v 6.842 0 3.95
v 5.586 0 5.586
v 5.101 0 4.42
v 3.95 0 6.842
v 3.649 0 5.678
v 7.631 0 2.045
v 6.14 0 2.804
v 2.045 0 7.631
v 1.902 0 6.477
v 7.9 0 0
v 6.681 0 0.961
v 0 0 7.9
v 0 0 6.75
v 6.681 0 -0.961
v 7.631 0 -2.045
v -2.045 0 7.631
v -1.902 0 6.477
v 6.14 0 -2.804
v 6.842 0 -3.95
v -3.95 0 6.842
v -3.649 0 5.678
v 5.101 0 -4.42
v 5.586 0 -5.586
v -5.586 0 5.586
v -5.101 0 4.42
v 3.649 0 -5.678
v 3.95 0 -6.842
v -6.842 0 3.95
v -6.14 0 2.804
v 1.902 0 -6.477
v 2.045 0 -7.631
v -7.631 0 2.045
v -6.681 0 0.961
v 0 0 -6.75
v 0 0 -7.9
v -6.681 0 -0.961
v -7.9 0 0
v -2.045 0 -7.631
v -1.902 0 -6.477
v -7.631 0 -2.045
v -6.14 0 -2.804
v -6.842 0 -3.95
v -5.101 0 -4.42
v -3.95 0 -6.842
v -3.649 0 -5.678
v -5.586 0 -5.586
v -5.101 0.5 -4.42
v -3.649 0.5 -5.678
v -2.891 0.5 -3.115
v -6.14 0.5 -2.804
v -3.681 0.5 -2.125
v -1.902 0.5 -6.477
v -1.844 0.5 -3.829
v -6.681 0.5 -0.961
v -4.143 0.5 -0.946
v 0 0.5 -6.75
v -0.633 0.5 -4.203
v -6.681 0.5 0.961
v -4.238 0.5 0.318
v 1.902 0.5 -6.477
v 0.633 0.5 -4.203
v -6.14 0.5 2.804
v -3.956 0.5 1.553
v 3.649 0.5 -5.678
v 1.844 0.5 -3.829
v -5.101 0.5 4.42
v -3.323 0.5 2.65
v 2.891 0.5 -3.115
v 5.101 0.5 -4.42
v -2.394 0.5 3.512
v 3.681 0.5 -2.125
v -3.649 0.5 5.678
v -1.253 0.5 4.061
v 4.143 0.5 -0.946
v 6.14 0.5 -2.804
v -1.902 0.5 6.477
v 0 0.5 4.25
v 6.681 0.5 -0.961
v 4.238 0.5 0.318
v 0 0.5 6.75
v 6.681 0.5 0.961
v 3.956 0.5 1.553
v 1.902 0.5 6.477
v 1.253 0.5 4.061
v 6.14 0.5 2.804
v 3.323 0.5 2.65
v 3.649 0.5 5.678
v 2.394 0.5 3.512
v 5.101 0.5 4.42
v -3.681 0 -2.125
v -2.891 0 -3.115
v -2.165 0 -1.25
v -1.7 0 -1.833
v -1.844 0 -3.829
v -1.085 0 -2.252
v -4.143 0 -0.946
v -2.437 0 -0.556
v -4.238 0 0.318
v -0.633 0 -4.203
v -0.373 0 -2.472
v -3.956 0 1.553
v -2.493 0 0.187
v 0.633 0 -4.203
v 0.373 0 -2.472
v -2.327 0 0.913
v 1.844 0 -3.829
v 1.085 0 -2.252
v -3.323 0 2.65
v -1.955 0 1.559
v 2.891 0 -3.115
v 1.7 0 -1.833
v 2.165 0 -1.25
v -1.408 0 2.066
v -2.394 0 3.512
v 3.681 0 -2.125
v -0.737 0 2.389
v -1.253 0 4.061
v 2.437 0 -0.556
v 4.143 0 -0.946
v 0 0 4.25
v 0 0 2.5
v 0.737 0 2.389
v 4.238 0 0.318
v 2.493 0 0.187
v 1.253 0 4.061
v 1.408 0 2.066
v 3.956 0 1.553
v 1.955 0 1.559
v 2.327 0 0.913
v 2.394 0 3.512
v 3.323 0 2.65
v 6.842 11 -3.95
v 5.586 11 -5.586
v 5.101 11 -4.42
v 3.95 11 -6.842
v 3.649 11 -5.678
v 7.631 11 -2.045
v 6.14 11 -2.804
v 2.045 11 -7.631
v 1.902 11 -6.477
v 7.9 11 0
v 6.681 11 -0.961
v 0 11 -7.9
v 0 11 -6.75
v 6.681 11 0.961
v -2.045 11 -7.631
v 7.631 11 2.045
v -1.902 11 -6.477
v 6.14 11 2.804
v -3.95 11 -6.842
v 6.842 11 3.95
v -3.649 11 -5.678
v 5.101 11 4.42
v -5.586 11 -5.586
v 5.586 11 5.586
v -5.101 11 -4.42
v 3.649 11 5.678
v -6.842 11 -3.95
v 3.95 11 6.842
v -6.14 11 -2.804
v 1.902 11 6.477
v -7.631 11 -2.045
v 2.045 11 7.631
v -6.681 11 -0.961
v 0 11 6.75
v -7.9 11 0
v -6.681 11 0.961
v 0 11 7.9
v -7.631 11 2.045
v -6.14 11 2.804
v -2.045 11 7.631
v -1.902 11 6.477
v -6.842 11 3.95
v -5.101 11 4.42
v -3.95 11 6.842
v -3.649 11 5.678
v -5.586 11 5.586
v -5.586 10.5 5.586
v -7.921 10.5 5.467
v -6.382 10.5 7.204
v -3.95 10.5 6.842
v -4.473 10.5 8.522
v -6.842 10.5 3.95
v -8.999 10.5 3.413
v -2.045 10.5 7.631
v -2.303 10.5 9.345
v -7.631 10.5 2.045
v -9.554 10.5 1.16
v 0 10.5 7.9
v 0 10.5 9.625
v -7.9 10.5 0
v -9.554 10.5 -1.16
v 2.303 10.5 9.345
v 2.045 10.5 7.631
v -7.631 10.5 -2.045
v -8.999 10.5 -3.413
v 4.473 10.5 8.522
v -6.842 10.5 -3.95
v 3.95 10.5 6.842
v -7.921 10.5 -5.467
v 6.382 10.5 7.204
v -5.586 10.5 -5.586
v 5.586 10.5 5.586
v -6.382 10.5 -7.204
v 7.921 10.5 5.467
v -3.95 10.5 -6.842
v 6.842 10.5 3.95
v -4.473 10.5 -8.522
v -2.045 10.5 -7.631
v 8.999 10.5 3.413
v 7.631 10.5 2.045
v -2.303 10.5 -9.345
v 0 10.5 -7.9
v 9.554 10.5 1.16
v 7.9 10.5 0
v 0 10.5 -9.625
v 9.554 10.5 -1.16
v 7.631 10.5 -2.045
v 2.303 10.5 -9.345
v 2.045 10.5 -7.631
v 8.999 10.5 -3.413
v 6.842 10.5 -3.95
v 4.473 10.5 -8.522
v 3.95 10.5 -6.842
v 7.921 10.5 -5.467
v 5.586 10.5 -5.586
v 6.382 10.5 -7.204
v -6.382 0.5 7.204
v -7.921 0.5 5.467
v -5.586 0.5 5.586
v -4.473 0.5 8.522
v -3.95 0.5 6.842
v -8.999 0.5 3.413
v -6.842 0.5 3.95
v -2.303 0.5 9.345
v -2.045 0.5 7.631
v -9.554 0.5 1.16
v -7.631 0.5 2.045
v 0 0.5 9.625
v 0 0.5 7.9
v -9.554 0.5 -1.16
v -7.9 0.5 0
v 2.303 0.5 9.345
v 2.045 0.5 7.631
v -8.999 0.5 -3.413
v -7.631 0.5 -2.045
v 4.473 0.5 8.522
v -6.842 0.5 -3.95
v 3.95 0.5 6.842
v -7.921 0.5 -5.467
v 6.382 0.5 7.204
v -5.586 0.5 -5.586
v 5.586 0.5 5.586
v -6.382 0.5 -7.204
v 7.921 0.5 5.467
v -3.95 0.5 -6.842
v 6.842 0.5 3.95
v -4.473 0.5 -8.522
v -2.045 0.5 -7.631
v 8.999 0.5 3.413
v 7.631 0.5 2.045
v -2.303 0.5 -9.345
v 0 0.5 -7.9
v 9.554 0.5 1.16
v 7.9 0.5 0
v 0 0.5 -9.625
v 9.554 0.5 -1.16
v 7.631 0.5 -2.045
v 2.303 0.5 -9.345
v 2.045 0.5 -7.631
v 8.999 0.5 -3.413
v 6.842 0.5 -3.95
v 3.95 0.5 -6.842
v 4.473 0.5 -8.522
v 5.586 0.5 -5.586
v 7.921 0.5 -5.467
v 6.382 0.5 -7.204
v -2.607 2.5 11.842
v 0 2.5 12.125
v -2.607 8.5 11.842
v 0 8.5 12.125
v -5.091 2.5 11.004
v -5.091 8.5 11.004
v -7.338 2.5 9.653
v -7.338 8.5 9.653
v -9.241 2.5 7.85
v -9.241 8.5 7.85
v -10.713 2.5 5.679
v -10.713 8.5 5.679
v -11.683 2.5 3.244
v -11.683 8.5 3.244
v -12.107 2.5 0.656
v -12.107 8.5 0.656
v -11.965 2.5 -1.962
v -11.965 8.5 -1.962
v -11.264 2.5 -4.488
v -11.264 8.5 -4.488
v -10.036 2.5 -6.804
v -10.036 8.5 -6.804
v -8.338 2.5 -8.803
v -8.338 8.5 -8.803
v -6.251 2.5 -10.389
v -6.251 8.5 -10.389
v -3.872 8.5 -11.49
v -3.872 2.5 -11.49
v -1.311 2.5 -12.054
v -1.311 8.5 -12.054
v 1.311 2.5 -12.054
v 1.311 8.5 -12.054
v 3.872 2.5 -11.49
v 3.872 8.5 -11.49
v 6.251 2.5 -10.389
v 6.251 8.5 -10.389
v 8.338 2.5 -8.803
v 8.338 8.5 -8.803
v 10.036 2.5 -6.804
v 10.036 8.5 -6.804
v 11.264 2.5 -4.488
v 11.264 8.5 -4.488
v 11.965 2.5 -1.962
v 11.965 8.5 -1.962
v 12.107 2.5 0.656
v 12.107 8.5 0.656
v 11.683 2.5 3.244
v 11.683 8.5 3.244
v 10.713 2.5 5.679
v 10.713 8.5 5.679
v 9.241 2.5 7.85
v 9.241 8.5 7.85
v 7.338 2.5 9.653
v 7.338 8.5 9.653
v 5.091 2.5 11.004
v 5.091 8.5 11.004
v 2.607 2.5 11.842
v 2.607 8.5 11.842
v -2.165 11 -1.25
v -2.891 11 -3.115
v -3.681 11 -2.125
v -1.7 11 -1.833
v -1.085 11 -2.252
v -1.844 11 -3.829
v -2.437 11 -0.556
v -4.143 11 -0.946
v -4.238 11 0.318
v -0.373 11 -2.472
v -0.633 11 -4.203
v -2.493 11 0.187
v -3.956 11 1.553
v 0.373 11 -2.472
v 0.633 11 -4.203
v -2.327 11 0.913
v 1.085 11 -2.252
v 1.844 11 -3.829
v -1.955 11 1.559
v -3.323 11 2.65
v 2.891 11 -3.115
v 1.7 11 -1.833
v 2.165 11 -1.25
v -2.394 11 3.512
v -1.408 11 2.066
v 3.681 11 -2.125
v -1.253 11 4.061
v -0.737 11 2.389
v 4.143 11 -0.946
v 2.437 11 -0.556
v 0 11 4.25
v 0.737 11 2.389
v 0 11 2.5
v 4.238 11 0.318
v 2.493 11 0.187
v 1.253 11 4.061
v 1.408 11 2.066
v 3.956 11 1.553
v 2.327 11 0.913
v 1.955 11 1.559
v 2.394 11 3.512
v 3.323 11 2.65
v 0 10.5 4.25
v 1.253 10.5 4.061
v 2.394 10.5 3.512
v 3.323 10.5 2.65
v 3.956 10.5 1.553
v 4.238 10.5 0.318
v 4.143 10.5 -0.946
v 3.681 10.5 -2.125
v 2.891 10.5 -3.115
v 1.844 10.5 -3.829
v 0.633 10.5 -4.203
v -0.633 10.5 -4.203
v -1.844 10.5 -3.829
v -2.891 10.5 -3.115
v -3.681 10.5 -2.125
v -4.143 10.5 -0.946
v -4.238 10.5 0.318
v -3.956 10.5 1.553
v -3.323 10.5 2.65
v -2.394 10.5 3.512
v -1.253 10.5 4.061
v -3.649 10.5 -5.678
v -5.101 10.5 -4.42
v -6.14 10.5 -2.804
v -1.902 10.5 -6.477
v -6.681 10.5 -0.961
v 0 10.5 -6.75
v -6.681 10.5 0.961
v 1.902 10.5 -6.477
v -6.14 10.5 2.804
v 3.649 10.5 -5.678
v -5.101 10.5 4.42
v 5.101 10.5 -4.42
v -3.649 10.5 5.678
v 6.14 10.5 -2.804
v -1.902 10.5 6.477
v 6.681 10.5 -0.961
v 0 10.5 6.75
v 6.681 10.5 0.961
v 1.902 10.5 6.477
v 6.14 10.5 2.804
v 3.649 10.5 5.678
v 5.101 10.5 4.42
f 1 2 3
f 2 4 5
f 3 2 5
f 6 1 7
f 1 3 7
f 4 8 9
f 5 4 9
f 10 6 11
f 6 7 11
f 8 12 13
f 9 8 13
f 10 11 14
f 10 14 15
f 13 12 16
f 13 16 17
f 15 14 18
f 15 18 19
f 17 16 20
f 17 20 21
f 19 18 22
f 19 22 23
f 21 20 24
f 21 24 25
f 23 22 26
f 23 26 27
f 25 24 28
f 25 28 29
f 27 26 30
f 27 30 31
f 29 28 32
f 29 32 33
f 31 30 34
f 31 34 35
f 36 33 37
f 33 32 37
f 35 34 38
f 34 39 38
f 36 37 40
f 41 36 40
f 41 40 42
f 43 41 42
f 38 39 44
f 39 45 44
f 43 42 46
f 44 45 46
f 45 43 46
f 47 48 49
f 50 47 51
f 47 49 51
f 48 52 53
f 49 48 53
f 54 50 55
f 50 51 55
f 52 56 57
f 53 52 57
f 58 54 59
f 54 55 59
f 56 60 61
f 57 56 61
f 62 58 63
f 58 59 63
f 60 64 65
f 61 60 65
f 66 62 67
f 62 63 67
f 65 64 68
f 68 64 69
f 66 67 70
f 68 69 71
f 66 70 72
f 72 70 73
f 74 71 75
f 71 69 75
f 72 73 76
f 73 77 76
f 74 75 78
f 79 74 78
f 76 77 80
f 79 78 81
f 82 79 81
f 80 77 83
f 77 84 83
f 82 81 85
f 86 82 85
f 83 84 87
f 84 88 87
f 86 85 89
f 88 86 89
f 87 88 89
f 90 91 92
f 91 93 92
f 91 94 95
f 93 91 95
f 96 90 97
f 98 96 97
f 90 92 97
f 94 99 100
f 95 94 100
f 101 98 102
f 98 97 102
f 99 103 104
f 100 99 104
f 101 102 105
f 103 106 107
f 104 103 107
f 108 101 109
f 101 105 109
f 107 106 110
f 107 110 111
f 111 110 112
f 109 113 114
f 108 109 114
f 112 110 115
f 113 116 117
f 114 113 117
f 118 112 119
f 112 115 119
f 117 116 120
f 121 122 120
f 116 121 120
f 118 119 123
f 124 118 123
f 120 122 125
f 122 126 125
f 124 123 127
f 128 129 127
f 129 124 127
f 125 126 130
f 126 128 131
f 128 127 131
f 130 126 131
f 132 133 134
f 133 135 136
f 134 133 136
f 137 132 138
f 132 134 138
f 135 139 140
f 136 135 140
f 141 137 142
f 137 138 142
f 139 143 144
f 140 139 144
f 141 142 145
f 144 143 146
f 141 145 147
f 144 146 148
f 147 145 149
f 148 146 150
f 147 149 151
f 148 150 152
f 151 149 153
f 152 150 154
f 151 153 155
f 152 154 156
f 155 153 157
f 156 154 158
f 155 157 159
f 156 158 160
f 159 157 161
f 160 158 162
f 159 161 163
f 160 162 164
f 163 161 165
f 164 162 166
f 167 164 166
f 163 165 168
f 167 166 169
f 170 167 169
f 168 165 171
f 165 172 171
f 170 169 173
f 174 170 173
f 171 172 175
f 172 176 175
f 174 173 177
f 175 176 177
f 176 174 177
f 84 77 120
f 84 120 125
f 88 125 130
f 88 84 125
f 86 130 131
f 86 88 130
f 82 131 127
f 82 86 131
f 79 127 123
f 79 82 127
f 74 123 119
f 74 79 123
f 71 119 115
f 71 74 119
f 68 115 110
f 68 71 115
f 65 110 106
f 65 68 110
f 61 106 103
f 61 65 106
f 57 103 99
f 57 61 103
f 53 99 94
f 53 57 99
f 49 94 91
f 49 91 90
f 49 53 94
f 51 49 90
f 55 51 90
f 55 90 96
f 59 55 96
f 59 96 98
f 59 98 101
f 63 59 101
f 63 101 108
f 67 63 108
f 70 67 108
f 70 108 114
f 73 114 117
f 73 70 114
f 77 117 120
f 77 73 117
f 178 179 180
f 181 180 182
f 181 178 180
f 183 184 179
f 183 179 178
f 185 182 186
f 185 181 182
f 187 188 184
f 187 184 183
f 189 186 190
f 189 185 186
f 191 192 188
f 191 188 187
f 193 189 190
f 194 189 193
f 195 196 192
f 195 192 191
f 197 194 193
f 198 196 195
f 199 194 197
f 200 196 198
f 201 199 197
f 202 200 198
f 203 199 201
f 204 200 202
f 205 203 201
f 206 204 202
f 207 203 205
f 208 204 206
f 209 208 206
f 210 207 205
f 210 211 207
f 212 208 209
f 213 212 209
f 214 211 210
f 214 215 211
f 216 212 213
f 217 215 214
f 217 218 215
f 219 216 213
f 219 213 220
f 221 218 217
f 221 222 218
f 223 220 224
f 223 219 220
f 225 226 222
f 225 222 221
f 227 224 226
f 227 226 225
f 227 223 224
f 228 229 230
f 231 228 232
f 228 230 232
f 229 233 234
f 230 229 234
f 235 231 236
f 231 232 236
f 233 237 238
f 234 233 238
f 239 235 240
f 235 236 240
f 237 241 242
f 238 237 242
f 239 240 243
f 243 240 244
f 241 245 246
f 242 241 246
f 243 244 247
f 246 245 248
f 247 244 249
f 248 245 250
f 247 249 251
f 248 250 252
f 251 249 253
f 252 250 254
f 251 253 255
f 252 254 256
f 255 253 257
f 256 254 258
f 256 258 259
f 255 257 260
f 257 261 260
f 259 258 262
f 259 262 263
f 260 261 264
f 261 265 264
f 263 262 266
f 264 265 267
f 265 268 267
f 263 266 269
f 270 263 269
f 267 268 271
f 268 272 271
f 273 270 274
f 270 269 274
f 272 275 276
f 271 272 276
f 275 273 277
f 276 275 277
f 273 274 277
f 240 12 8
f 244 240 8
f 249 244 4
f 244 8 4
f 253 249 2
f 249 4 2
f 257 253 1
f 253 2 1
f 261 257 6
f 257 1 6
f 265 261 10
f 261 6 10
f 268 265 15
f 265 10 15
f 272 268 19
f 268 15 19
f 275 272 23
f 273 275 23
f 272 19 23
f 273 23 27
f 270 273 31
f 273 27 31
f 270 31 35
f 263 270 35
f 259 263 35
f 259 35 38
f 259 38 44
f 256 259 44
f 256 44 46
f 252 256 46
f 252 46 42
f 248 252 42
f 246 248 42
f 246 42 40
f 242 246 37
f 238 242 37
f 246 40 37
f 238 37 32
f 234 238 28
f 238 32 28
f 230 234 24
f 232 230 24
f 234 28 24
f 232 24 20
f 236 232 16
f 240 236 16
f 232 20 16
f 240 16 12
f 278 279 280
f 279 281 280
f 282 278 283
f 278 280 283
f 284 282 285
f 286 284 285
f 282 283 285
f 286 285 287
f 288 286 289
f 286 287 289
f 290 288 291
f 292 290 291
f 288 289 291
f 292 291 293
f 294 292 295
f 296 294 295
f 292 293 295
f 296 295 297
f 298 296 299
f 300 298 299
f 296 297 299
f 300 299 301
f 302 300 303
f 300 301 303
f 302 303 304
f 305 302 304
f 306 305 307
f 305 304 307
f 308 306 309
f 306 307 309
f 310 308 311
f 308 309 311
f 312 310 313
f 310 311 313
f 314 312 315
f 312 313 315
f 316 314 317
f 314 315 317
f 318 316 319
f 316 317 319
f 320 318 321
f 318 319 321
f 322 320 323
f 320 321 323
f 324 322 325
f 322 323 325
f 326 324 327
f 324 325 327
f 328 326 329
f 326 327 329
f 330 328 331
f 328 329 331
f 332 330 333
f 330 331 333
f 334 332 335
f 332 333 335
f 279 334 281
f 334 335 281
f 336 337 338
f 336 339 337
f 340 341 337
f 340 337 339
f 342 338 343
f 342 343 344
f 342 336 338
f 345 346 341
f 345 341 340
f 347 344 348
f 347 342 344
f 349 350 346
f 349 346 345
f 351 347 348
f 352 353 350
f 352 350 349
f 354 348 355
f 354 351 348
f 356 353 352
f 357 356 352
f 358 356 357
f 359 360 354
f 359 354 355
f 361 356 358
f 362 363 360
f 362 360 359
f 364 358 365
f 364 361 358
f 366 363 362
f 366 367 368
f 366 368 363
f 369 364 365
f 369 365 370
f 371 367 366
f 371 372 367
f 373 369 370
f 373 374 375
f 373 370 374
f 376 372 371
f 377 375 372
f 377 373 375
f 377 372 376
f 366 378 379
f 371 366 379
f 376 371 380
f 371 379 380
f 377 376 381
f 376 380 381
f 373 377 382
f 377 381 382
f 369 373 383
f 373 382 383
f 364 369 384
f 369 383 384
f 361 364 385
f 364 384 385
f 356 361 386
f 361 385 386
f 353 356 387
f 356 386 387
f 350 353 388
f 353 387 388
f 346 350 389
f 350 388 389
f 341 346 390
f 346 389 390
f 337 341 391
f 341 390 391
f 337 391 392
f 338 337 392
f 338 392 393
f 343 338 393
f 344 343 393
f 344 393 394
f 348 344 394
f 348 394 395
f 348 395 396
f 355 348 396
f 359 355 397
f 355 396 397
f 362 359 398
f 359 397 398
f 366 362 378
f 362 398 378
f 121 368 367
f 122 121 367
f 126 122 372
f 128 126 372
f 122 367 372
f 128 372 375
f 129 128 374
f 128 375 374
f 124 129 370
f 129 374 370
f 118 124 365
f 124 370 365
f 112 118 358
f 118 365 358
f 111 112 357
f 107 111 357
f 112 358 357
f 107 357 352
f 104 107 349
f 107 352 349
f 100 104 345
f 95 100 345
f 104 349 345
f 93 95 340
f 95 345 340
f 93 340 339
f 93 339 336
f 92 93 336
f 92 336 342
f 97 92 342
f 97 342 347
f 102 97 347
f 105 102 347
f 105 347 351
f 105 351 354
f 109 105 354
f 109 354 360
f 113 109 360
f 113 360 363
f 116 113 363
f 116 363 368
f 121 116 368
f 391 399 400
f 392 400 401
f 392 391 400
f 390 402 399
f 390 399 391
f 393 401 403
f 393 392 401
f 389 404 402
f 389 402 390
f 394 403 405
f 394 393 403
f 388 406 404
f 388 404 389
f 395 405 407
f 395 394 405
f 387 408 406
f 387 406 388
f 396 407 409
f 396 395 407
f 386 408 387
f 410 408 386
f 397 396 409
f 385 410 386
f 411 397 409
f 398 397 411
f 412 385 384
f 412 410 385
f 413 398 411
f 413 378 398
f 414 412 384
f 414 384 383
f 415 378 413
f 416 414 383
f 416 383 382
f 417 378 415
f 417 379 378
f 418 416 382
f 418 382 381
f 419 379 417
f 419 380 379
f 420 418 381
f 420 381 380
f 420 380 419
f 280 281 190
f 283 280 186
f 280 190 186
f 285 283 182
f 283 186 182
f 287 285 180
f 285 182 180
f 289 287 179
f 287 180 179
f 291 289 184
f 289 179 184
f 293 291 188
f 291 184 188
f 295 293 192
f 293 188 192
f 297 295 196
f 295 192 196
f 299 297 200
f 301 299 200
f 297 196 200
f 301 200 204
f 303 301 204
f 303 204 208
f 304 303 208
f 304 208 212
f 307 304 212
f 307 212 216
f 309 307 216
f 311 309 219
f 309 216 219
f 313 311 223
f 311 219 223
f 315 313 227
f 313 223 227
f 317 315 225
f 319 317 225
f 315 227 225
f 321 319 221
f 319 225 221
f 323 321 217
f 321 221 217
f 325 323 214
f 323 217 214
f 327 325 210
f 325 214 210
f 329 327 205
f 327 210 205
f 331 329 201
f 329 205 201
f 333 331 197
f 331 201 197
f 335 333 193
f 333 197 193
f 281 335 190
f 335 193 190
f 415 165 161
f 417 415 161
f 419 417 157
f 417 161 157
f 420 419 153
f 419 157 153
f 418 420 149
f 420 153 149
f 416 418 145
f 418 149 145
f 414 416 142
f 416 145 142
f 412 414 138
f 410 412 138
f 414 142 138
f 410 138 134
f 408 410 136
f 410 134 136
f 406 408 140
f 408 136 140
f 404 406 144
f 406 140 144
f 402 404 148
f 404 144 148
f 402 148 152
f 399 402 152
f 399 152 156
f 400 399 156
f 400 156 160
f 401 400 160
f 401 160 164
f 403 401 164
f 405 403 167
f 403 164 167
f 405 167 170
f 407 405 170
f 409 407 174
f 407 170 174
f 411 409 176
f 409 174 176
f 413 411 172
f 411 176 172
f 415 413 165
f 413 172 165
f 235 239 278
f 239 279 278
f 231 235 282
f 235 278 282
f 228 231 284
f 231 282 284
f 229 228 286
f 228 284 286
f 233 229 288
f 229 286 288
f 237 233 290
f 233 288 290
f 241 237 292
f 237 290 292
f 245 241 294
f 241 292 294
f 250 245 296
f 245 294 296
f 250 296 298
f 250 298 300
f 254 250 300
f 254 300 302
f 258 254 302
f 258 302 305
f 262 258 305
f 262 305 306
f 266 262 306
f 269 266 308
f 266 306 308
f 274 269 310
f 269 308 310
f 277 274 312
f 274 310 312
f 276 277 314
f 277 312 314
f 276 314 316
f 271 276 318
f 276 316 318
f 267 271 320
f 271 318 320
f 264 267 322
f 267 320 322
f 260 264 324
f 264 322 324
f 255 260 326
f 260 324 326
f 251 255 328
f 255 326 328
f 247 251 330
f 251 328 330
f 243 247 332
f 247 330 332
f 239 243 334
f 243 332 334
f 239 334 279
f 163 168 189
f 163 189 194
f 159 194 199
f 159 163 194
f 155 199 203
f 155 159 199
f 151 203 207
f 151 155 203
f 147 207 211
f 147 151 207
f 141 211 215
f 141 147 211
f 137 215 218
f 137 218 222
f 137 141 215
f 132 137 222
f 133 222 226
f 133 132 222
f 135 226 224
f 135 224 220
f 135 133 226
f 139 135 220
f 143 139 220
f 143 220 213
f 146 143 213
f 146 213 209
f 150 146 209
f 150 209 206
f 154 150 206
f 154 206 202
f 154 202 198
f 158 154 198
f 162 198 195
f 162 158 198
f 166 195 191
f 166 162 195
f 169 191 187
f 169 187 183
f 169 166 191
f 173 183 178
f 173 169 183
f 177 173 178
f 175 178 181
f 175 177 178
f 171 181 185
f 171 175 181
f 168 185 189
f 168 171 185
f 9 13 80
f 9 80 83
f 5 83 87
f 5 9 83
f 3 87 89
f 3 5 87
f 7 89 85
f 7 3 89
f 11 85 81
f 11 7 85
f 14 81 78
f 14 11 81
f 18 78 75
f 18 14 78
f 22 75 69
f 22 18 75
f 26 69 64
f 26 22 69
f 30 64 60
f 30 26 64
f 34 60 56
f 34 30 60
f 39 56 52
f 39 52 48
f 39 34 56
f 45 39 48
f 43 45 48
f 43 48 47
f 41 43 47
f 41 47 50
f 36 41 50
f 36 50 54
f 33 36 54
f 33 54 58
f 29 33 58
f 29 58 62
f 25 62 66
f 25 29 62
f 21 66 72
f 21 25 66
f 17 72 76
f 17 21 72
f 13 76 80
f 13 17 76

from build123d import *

# Parameters (mm, degrees)
SKETCH4_R           = 10.429730926
SKETCH4_R_2         = 7.9
CUT_EXTRUDE1_DEPTH  = 0.5
SKETCH5_R           = 6.75
CUT_EXTRUDE2_DEPTH  = 0.5
SKETCH6_R           = 4.25
BOSS_EXTRUDE1_DEPTH = 0.5
SKETCH7_R           = 2.5
CUT_EXTRUDE3_DEPTH  = 21.372315774


with BuildPart() as part:
    # Sketch1 → Revolve1 (revolve)
    with BuildSketch(Plane.XY, mode=Mode.PRIVATE) as revolve1_sk:
        Polygon((0, 0), (-8.999444444, 0), (-12.125, 2.5), (-12.125, 8.5), (-8.999444444, 11), (0, 11), align=None)
    revolve(revolve1_sk.sketch.rotate(Axis((0, 11, 0), (0, -1, 0)), 270), axis=Axis((0, 11, 0), (0, -1, 0)))

    # Sketch4 → Cut-Extrude1 (cut)
    with BuildSketch(Plane(origin=(0, 11, 0), x_dir=(1, 0, 0), z_dir=(0, 1, 0))):
        Circle(SKETCH4_R)
        with Locations(Location((0, 0, 0), (0, 0, 270))):
            Circle(SKETCH4_R_2, mode=Mode.SUBTRACT)
    cut_extrude1 = extrude(amount=-CUT_EXTRUDE1_DEPTH, mode=Mode.SUBTRACT)

    # Sketch5 → Cut-Extrude2 (cut)
    with BuildSketch(Plane(origin=(0, 11, 0), x_dir=(1, 0, 0), z_dir=(0, 1, 0))):
        with Locations(Location((0, 0, 0), (0, 0, 270))):
            Circle(SKETCH5_R)
    cut_extrude2 = extrude(amount=-CUT_EXTRUDE2_DEPTH, mode=Mode.SUBTRACT)

    # Sketch6 → Boss-Extrude1 (add)
    with BuildSketch(Plane(origin=(0, 10.5, 0), x_dir=(1, 0, 0), z_dir=(0, 1, 0))):
        with Locations(Location((0, 0, 0), (0, 0, 270))):
            Circle(SKETCH6_R)
    boss_extrude1 = extrude(amount=BOSS_EXTRUDE1_DEPTH)

    # Mirror1: Cut-Extrude1, Cut-Extrude2, Boss-Extrude1 across plane
    add(cut_extrude1.mirror(Plane.ZX.offset(5.5)), mode=Mode.SUBTRACT)
    add(cut_extrude2.mirror(Plane.ZX.offset(5.5)), mode=Mode.SUBTRACT)
    add(boss_extrude1.mirror(Plane.ZX.offset(5.5)))

    # Sketch7 → Cut-Extrude3 (cut, through all)
    with BuildSketch(Plane(origin=(0, 11, 0), x_dir=(1, 0, 0), z_dir=(0, 1, 0))):
        with Locations(Location((0, 0, 0), (0, 0, 270))):
            Circle(SKETCH7_R)
    extrude(amount=-CUT_EXTRUDE3_DEPTH, mode=Mode.SUBTRACT)


solid = part.part
